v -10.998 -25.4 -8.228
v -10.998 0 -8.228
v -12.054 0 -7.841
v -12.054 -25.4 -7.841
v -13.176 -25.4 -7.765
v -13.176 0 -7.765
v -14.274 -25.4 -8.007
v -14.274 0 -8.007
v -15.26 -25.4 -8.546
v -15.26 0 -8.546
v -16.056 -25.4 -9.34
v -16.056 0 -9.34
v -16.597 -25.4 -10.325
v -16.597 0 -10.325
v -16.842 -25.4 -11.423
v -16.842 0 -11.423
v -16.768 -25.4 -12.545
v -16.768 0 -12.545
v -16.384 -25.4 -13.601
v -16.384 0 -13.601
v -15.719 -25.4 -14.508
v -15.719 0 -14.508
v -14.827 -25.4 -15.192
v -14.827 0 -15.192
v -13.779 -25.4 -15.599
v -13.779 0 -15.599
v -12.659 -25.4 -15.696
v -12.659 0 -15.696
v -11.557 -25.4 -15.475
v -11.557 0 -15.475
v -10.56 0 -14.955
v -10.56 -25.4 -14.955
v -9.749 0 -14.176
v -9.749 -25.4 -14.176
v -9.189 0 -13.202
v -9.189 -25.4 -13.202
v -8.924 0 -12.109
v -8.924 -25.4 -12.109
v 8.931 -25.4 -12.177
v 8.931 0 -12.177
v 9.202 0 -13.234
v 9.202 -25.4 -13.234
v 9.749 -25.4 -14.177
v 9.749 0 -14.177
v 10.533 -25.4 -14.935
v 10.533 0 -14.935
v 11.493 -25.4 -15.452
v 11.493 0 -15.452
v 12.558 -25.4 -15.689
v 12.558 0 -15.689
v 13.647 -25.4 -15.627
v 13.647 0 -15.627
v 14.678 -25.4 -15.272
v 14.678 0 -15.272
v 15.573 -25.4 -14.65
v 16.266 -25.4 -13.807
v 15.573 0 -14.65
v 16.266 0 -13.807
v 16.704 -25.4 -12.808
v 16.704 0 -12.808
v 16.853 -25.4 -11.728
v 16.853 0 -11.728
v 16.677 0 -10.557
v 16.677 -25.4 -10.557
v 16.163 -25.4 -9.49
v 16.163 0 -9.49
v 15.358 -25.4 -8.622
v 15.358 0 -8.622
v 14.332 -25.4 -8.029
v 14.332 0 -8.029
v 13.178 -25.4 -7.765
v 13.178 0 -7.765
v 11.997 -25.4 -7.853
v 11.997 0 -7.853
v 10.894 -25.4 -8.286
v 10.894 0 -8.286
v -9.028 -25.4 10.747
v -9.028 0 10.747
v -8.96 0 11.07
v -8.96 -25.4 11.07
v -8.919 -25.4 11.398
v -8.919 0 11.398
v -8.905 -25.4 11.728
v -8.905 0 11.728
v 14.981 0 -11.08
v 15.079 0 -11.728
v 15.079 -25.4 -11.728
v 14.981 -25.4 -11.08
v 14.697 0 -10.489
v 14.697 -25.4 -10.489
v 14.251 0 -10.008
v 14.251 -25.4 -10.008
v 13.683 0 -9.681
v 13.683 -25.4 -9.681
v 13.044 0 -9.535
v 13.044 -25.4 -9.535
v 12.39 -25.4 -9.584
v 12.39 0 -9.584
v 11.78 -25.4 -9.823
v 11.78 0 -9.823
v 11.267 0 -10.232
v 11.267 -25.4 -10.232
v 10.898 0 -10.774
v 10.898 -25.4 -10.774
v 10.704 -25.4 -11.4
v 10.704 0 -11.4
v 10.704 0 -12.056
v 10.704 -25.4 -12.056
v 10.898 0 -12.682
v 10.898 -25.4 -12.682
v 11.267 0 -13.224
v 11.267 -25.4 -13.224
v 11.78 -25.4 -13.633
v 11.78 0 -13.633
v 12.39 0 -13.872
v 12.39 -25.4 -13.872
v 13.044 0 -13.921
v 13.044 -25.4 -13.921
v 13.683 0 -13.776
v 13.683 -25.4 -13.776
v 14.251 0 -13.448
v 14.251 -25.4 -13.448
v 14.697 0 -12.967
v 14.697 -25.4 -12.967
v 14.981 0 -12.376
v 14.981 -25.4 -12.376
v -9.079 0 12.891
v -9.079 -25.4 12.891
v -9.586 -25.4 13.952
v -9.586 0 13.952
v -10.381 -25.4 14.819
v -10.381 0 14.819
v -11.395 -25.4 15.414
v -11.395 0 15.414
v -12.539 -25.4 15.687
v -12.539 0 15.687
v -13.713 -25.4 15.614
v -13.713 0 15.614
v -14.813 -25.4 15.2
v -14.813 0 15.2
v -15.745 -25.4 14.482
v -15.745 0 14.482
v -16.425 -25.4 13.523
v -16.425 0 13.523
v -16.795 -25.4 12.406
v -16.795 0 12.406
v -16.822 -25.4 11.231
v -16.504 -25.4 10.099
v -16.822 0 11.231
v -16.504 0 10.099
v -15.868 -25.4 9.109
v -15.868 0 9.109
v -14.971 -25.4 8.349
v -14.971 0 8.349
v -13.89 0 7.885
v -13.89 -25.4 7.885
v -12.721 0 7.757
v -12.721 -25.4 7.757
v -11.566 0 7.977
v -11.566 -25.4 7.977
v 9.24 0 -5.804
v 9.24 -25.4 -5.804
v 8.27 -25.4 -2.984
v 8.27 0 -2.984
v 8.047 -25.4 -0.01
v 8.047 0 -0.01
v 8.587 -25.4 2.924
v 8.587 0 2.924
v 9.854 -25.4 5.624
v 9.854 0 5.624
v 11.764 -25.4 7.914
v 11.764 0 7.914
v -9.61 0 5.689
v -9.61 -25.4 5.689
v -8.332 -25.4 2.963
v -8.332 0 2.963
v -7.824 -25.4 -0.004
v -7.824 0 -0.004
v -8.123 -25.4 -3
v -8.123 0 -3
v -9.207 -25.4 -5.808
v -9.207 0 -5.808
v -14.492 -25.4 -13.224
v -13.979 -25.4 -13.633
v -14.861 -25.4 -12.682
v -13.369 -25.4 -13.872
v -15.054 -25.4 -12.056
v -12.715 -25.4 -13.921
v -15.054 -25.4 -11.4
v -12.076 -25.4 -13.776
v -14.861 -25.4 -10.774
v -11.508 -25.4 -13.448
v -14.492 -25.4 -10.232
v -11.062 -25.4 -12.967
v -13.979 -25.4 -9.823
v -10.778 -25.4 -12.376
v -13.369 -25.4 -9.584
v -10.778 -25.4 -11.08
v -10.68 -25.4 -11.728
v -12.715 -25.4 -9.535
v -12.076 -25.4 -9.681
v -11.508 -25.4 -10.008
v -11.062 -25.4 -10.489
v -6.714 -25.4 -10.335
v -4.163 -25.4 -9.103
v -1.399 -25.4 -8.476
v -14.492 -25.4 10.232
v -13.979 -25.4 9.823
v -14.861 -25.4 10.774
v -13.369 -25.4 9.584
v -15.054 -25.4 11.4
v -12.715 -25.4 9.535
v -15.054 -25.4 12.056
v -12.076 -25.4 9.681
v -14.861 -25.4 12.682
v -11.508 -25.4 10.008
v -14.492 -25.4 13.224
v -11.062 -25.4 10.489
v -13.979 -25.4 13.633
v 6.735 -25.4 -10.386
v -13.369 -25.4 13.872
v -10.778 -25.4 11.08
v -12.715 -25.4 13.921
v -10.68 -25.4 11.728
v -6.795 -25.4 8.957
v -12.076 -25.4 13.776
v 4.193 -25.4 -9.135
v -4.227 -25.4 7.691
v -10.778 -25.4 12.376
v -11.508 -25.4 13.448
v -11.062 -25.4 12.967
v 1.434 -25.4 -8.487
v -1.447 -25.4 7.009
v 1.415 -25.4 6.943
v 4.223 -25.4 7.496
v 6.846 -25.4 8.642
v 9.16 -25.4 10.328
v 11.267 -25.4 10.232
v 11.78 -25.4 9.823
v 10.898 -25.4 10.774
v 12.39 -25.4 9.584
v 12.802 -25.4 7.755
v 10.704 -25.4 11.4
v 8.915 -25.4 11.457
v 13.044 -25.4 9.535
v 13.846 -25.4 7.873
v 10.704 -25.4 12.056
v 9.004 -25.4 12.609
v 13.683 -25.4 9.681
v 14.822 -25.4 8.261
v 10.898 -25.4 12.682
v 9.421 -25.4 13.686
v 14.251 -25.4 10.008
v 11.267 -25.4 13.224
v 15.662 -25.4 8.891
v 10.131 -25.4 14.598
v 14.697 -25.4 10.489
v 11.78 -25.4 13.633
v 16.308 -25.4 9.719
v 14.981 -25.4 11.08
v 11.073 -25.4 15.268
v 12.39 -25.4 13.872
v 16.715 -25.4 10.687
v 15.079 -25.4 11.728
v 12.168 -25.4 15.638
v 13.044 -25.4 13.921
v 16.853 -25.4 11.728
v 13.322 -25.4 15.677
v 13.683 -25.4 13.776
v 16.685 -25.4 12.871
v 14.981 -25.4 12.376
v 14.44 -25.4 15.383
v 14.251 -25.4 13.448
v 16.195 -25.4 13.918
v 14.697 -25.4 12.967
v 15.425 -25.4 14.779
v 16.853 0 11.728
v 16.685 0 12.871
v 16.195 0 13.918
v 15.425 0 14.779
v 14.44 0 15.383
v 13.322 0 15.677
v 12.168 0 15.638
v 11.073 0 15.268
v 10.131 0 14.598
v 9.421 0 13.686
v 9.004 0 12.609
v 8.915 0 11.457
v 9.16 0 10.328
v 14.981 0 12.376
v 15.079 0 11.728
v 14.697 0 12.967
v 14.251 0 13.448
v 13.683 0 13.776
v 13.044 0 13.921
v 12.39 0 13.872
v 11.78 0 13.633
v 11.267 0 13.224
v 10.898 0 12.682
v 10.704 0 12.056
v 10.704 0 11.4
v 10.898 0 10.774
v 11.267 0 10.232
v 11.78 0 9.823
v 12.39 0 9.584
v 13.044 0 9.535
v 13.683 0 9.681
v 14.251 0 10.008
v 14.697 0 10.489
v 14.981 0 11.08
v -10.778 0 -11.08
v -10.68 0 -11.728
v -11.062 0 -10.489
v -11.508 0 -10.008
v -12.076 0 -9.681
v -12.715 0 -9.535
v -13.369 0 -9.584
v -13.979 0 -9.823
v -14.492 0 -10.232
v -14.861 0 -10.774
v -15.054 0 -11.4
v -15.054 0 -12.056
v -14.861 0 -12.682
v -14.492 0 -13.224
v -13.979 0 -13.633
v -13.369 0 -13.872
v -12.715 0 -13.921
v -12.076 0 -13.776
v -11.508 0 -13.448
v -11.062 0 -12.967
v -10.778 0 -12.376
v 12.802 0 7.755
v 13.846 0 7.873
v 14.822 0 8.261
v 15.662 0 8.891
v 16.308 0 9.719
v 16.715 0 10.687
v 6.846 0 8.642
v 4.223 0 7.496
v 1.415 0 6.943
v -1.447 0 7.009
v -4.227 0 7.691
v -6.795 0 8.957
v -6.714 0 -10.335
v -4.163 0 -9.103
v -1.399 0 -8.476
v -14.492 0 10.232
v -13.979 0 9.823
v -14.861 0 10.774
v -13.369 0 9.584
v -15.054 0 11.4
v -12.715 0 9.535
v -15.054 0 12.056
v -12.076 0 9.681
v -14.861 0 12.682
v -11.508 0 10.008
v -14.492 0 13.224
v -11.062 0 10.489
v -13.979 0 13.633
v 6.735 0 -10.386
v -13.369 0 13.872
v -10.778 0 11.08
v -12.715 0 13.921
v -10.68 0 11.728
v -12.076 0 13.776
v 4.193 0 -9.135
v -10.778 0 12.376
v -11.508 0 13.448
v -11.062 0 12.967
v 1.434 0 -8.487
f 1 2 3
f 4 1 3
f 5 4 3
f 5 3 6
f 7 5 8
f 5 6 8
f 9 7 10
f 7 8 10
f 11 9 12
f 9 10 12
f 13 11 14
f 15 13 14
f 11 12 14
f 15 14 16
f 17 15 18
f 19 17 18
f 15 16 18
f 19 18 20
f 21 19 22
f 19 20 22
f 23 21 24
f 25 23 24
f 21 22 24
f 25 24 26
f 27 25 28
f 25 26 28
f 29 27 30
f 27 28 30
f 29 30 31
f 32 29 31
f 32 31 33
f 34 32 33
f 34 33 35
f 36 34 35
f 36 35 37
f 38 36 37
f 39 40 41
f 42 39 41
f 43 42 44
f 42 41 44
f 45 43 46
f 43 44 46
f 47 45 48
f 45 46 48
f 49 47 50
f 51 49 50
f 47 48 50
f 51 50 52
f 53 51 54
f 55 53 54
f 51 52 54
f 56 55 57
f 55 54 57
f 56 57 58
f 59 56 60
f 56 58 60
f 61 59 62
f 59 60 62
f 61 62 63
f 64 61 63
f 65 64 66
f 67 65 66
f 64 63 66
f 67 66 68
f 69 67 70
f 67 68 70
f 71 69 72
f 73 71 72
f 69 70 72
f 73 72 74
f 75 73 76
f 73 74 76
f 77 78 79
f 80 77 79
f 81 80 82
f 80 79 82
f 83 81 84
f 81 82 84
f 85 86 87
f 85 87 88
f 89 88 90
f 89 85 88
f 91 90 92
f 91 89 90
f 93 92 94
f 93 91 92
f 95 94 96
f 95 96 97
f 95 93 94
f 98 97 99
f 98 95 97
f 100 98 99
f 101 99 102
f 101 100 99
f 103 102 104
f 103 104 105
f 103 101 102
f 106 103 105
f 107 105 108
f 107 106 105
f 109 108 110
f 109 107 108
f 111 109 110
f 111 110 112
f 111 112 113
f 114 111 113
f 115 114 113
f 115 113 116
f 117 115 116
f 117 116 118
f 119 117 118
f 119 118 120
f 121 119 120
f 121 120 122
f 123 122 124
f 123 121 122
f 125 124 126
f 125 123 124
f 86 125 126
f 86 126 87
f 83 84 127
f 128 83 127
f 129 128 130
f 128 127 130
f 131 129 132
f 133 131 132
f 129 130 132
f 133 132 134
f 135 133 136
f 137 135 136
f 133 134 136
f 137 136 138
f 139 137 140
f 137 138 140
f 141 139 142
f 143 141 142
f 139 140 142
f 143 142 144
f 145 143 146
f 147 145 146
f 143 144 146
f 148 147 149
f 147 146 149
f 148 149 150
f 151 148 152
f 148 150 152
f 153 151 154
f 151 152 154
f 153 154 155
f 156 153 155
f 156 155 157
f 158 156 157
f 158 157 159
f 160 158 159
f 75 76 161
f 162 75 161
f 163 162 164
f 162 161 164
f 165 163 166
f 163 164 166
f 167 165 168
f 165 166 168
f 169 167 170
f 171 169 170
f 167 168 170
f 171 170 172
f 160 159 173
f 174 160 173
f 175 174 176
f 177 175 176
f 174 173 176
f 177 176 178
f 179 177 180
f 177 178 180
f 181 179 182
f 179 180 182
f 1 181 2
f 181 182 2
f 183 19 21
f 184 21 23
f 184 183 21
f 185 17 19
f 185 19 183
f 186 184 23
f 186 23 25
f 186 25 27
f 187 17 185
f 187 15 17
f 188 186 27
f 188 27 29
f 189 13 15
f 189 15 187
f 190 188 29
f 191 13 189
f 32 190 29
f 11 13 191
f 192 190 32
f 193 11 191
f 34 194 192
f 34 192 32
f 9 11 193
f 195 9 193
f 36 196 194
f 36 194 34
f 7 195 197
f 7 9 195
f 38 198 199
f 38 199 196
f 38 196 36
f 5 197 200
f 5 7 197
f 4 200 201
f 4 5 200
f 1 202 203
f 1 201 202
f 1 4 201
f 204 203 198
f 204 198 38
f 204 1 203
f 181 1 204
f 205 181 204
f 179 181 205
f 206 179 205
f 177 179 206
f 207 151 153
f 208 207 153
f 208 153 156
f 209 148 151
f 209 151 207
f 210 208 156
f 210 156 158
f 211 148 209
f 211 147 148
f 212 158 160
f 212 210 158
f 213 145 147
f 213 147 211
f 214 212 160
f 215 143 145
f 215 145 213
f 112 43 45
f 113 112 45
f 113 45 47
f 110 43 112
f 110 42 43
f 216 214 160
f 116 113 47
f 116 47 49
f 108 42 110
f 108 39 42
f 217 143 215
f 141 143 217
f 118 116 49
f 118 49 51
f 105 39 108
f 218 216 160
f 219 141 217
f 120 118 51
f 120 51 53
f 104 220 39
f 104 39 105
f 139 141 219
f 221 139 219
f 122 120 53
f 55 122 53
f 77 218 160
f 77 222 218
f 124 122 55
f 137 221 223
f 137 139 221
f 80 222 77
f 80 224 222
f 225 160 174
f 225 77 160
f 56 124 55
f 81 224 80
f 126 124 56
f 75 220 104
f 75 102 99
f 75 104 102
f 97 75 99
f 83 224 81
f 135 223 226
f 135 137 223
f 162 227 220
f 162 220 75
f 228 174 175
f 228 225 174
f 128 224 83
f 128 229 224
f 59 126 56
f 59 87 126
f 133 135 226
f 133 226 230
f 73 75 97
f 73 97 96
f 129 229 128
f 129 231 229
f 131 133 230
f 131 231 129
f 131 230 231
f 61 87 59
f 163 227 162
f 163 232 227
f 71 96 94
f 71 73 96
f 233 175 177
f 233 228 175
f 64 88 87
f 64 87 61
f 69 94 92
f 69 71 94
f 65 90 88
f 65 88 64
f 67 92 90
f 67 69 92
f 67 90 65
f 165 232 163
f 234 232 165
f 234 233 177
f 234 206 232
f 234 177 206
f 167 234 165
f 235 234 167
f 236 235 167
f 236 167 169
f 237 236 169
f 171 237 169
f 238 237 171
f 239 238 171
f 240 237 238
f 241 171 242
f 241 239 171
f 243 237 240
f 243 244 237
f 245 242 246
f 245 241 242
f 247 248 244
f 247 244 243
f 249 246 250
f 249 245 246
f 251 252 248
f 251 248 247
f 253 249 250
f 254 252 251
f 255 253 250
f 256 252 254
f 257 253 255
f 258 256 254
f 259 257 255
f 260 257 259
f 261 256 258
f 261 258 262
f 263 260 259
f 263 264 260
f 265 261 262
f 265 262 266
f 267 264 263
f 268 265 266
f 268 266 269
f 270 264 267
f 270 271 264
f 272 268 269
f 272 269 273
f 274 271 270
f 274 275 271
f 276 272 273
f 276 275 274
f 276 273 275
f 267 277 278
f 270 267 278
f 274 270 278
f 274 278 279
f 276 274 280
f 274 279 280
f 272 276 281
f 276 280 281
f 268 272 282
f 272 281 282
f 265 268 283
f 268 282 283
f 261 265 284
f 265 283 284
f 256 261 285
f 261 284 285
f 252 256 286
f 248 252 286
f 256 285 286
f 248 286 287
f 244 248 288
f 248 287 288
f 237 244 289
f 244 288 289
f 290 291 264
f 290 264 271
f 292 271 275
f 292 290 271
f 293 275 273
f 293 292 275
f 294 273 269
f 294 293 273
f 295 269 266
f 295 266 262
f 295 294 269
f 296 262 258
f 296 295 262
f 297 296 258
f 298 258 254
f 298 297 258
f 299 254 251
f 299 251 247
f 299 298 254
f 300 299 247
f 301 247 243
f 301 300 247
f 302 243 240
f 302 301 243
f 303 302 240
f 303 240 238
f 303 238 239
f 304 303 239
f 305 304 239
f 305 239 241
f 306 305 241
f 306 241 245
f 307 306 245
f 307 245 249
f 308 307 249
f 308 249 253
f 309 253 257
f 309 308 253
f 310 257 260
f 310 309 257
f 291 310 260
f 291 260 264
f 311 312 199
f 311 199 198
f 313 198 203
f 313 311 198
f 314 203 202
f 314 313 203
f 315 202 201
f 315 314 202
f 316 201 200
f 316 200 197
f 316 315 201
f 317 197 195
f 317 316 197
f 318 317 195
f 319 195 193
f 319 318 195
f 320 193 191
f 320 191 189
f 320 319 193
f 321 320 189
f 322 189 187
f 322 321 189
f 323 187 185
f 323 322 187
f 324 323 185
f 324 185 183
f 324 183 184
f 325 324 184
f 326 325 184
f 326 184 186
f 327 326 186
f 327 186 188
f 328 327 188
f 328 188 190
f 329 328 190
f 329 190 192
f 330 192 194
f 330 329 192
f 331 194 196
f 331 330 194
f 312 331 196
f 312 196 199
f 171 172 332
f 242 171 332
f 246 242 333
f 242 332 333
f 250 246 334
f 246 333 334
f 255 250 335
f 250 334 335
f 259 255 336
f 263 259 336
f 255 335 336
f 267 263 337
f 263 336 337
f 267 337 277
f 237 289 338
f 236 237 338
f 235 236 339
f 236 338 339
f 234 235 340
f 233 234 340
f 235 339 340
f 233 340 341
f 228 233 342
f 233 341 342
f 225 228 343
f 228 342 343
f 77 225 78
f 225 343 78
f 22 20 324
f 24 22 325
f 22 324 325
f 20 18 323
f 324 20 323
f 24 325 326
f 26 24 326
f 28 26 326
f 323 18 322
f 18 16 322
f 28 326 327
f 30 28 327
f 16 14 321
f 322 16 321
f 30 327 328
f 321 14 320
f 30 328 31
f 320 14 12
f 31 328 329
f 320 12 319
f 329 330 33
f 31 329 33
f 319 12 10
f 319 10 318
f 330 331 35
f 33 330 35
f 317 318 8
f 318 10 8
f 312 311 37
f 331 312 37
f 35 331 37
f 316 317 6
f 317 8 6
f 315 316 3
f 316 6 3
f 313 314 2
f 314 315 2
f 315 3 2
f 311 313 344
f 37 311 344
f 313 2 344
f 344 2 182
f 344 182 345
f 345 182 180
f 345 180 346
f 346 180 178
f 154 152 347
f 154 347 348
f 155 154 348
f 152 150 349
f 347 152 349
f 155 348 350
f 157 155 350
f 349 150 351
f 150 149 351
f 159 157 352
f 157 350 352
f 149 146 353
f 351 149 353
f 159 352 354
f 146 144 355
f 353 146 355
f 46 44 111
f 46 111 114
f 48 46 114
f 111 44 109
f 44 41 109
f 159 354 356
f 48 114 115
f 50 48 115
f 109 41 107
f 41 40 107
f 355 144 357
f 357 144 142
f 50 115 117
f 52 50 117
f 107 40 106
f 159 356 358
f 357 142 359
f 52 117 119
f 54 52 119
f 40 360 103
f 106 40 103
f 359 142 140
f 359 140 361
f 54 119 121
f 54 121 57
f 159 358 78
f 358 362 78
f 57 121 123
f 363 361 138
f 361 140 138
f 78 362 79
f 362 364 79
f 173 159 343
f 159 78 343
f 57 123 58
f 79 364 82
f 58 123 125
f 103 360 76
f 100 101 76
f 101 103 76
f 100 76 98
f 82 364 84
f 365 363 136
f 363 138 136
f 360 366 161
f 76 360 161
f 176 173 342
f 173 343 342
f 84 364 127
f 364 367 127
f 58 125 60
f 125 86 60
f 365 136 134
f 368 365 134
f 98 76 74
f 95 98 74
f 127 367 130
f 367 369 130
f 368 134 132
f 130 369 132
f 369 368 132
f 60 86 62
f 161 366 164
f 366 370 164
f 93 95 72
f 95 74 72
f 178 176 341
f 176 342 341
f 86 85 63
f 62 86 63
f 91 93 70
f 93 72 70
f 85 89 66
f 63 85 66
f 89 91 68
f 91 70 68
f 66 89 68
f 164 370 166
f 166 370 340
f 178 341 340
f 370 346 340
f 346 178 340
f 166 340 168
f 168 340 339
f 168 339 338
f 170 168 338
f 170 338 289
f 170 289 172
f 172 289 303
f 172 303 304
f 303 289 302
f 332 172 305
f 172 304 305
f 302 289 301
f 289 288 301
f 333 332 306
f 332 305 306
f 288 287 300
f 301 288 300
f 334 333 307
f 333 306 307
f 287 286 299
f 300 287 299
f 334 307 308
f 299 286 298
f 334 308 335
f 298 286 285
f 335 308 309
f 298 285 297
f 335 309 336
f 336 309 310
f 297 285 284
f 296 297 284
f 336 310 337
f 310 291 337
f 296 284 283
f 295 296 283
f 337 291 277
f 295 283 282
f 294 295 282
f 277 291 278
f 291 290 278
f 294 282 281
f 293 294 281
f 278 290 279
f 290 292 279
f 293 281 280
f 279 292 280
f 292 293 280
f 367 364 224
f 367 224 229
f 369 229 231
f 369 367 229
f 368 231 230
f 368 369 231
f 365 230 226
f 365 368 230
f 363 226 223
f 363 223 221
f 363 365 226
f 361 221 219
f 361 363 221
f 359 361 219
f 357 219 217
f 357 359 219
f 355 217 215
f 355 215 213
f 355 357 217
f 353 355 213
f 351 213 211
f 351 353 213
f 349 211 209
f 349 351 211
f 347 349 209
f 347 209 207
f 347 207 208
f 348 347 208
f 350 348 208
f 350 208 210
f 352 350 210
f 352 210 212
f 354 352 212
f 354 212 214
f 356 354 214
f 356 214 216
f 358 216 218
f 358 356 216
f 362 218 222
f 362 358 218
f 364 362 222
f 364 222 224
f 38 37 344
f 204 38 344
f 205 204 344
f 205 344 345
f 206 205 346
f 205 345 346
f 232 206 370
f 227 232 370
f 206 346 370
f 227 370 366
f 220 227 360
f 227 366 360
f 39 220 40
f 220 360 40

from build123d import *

# Parameters (mm, degrees)
F0_R     = 2.199524
F1_DEPTH = 25.4


with BuildPart() as f1:
    # F0 (on Front) → F1 (new body)
    with BuildSketch(Plane.XZ):
        with BuildLine():
            ThreePointArc((-11.566241, 7.977341), (-9.949435, 9.043299), (-9.028414, 10.746839))
            ThreePointArc((-9.028414, 10.746839), (-8.936246, 11.233619), (-8.905364, 11.728085))
            ThreePointArc((-8.905364, 11.728085), (-16.120469, 14.027451), (-11.566241, 7.977341))
        make_face()
        with Locations((-12.879306, 11.728085)):
            Circle(F0_R, mode=Mode.SUBTRACT)
        with BuildLine():
            ThreePointArc((9.160321, 10.327597), (-0.017937, 6.897642), (-9.028414, 10.746839))
            ThreePointArc((-9.028414, 10.746839), (-9.949435, 9.043299), (-11.566241, 7.977341))
            ThreePointArc((-11.566241, 7.977341), (-7.823792, -0.003878), (-10.998232, -8.227545))
            ThreePointArc((-10.998232, -8.227545), (-9.468478, -9.688852), (-8.905364, -11.728085))
            ThreePointArc((-8.905364, -11.728085), (-8.909947, -11.918878), (-8.923684, -12.109232))
            ThreePointArc((-8.923684, -12.109232), (0.017868, -8.401069), (8.930846, -12.177395))
            ThreePointArc((8.930846, -12.177395), (9.331227, -9.938293), (10.894039, -8.285566))
            ThreePointArc((10.894039, -8.285566), (8.047392, -0.009584), (11.764413, 7.913739))
            ThreePointArc((11.764413, 7.913739), (10.177775, 8.813647), (9.160321, 10.327597))
        make_face()
        with BuildLine():
            ThreePointArc((16.853249, 11.728085), (12.167553, 15.637768), (9.160321, 10.327597))
            ThreePointArc((9.160321, 10.327597), (10.177775, 8.813647), (11.764413, 7.913739))
            ThreePointArc((11.764413, 7.913739), (15.26276, 8.548246), (16.853249, 11.728085))
        make_face()
        with Locations((12.879306, 11.728085)):
            Circle(F0_R, mode=Mode.SUBTRACT)
        with BuildLine():
            ThreePointArc((-8.905364, -11.728085), (-9.468478, -9.688852), (-10.998232, -8.227545))
            ThreePointArc((-10.998232, -8.227545), (-16.384108, -13.601207), (-8.923684, -12.109232))
            ThreePointArc((-8.923684, -12.109232), (-8.909947, -11.918878), (-8.905364, -11.728085))
        make_face()
        with Locations((-12.879306, -11.728085)):
            Circle(F0_R, mode=Mode.SUBTRACT)
        with BuildLine():
            ThreePointArc((16.853249, -11.728085), (14.867129, -8.287041), (10.894039, -8.285566))
            ThreePointArc((10.894039, -8.285566), (9.331227, -9.938293), (8.930846, -12.177395))
            ThreePointArc((8.930846, -12.177395), (13.104323, -15.695652), (16.853249, -11.728085))
        make_face()
        with Locations((12.879306, -11.728085)):
            Circle(F0_R, mode=Mode.SUBTRACT)
    extrude(amount=F1_DEPTH)


solid = f1.part
